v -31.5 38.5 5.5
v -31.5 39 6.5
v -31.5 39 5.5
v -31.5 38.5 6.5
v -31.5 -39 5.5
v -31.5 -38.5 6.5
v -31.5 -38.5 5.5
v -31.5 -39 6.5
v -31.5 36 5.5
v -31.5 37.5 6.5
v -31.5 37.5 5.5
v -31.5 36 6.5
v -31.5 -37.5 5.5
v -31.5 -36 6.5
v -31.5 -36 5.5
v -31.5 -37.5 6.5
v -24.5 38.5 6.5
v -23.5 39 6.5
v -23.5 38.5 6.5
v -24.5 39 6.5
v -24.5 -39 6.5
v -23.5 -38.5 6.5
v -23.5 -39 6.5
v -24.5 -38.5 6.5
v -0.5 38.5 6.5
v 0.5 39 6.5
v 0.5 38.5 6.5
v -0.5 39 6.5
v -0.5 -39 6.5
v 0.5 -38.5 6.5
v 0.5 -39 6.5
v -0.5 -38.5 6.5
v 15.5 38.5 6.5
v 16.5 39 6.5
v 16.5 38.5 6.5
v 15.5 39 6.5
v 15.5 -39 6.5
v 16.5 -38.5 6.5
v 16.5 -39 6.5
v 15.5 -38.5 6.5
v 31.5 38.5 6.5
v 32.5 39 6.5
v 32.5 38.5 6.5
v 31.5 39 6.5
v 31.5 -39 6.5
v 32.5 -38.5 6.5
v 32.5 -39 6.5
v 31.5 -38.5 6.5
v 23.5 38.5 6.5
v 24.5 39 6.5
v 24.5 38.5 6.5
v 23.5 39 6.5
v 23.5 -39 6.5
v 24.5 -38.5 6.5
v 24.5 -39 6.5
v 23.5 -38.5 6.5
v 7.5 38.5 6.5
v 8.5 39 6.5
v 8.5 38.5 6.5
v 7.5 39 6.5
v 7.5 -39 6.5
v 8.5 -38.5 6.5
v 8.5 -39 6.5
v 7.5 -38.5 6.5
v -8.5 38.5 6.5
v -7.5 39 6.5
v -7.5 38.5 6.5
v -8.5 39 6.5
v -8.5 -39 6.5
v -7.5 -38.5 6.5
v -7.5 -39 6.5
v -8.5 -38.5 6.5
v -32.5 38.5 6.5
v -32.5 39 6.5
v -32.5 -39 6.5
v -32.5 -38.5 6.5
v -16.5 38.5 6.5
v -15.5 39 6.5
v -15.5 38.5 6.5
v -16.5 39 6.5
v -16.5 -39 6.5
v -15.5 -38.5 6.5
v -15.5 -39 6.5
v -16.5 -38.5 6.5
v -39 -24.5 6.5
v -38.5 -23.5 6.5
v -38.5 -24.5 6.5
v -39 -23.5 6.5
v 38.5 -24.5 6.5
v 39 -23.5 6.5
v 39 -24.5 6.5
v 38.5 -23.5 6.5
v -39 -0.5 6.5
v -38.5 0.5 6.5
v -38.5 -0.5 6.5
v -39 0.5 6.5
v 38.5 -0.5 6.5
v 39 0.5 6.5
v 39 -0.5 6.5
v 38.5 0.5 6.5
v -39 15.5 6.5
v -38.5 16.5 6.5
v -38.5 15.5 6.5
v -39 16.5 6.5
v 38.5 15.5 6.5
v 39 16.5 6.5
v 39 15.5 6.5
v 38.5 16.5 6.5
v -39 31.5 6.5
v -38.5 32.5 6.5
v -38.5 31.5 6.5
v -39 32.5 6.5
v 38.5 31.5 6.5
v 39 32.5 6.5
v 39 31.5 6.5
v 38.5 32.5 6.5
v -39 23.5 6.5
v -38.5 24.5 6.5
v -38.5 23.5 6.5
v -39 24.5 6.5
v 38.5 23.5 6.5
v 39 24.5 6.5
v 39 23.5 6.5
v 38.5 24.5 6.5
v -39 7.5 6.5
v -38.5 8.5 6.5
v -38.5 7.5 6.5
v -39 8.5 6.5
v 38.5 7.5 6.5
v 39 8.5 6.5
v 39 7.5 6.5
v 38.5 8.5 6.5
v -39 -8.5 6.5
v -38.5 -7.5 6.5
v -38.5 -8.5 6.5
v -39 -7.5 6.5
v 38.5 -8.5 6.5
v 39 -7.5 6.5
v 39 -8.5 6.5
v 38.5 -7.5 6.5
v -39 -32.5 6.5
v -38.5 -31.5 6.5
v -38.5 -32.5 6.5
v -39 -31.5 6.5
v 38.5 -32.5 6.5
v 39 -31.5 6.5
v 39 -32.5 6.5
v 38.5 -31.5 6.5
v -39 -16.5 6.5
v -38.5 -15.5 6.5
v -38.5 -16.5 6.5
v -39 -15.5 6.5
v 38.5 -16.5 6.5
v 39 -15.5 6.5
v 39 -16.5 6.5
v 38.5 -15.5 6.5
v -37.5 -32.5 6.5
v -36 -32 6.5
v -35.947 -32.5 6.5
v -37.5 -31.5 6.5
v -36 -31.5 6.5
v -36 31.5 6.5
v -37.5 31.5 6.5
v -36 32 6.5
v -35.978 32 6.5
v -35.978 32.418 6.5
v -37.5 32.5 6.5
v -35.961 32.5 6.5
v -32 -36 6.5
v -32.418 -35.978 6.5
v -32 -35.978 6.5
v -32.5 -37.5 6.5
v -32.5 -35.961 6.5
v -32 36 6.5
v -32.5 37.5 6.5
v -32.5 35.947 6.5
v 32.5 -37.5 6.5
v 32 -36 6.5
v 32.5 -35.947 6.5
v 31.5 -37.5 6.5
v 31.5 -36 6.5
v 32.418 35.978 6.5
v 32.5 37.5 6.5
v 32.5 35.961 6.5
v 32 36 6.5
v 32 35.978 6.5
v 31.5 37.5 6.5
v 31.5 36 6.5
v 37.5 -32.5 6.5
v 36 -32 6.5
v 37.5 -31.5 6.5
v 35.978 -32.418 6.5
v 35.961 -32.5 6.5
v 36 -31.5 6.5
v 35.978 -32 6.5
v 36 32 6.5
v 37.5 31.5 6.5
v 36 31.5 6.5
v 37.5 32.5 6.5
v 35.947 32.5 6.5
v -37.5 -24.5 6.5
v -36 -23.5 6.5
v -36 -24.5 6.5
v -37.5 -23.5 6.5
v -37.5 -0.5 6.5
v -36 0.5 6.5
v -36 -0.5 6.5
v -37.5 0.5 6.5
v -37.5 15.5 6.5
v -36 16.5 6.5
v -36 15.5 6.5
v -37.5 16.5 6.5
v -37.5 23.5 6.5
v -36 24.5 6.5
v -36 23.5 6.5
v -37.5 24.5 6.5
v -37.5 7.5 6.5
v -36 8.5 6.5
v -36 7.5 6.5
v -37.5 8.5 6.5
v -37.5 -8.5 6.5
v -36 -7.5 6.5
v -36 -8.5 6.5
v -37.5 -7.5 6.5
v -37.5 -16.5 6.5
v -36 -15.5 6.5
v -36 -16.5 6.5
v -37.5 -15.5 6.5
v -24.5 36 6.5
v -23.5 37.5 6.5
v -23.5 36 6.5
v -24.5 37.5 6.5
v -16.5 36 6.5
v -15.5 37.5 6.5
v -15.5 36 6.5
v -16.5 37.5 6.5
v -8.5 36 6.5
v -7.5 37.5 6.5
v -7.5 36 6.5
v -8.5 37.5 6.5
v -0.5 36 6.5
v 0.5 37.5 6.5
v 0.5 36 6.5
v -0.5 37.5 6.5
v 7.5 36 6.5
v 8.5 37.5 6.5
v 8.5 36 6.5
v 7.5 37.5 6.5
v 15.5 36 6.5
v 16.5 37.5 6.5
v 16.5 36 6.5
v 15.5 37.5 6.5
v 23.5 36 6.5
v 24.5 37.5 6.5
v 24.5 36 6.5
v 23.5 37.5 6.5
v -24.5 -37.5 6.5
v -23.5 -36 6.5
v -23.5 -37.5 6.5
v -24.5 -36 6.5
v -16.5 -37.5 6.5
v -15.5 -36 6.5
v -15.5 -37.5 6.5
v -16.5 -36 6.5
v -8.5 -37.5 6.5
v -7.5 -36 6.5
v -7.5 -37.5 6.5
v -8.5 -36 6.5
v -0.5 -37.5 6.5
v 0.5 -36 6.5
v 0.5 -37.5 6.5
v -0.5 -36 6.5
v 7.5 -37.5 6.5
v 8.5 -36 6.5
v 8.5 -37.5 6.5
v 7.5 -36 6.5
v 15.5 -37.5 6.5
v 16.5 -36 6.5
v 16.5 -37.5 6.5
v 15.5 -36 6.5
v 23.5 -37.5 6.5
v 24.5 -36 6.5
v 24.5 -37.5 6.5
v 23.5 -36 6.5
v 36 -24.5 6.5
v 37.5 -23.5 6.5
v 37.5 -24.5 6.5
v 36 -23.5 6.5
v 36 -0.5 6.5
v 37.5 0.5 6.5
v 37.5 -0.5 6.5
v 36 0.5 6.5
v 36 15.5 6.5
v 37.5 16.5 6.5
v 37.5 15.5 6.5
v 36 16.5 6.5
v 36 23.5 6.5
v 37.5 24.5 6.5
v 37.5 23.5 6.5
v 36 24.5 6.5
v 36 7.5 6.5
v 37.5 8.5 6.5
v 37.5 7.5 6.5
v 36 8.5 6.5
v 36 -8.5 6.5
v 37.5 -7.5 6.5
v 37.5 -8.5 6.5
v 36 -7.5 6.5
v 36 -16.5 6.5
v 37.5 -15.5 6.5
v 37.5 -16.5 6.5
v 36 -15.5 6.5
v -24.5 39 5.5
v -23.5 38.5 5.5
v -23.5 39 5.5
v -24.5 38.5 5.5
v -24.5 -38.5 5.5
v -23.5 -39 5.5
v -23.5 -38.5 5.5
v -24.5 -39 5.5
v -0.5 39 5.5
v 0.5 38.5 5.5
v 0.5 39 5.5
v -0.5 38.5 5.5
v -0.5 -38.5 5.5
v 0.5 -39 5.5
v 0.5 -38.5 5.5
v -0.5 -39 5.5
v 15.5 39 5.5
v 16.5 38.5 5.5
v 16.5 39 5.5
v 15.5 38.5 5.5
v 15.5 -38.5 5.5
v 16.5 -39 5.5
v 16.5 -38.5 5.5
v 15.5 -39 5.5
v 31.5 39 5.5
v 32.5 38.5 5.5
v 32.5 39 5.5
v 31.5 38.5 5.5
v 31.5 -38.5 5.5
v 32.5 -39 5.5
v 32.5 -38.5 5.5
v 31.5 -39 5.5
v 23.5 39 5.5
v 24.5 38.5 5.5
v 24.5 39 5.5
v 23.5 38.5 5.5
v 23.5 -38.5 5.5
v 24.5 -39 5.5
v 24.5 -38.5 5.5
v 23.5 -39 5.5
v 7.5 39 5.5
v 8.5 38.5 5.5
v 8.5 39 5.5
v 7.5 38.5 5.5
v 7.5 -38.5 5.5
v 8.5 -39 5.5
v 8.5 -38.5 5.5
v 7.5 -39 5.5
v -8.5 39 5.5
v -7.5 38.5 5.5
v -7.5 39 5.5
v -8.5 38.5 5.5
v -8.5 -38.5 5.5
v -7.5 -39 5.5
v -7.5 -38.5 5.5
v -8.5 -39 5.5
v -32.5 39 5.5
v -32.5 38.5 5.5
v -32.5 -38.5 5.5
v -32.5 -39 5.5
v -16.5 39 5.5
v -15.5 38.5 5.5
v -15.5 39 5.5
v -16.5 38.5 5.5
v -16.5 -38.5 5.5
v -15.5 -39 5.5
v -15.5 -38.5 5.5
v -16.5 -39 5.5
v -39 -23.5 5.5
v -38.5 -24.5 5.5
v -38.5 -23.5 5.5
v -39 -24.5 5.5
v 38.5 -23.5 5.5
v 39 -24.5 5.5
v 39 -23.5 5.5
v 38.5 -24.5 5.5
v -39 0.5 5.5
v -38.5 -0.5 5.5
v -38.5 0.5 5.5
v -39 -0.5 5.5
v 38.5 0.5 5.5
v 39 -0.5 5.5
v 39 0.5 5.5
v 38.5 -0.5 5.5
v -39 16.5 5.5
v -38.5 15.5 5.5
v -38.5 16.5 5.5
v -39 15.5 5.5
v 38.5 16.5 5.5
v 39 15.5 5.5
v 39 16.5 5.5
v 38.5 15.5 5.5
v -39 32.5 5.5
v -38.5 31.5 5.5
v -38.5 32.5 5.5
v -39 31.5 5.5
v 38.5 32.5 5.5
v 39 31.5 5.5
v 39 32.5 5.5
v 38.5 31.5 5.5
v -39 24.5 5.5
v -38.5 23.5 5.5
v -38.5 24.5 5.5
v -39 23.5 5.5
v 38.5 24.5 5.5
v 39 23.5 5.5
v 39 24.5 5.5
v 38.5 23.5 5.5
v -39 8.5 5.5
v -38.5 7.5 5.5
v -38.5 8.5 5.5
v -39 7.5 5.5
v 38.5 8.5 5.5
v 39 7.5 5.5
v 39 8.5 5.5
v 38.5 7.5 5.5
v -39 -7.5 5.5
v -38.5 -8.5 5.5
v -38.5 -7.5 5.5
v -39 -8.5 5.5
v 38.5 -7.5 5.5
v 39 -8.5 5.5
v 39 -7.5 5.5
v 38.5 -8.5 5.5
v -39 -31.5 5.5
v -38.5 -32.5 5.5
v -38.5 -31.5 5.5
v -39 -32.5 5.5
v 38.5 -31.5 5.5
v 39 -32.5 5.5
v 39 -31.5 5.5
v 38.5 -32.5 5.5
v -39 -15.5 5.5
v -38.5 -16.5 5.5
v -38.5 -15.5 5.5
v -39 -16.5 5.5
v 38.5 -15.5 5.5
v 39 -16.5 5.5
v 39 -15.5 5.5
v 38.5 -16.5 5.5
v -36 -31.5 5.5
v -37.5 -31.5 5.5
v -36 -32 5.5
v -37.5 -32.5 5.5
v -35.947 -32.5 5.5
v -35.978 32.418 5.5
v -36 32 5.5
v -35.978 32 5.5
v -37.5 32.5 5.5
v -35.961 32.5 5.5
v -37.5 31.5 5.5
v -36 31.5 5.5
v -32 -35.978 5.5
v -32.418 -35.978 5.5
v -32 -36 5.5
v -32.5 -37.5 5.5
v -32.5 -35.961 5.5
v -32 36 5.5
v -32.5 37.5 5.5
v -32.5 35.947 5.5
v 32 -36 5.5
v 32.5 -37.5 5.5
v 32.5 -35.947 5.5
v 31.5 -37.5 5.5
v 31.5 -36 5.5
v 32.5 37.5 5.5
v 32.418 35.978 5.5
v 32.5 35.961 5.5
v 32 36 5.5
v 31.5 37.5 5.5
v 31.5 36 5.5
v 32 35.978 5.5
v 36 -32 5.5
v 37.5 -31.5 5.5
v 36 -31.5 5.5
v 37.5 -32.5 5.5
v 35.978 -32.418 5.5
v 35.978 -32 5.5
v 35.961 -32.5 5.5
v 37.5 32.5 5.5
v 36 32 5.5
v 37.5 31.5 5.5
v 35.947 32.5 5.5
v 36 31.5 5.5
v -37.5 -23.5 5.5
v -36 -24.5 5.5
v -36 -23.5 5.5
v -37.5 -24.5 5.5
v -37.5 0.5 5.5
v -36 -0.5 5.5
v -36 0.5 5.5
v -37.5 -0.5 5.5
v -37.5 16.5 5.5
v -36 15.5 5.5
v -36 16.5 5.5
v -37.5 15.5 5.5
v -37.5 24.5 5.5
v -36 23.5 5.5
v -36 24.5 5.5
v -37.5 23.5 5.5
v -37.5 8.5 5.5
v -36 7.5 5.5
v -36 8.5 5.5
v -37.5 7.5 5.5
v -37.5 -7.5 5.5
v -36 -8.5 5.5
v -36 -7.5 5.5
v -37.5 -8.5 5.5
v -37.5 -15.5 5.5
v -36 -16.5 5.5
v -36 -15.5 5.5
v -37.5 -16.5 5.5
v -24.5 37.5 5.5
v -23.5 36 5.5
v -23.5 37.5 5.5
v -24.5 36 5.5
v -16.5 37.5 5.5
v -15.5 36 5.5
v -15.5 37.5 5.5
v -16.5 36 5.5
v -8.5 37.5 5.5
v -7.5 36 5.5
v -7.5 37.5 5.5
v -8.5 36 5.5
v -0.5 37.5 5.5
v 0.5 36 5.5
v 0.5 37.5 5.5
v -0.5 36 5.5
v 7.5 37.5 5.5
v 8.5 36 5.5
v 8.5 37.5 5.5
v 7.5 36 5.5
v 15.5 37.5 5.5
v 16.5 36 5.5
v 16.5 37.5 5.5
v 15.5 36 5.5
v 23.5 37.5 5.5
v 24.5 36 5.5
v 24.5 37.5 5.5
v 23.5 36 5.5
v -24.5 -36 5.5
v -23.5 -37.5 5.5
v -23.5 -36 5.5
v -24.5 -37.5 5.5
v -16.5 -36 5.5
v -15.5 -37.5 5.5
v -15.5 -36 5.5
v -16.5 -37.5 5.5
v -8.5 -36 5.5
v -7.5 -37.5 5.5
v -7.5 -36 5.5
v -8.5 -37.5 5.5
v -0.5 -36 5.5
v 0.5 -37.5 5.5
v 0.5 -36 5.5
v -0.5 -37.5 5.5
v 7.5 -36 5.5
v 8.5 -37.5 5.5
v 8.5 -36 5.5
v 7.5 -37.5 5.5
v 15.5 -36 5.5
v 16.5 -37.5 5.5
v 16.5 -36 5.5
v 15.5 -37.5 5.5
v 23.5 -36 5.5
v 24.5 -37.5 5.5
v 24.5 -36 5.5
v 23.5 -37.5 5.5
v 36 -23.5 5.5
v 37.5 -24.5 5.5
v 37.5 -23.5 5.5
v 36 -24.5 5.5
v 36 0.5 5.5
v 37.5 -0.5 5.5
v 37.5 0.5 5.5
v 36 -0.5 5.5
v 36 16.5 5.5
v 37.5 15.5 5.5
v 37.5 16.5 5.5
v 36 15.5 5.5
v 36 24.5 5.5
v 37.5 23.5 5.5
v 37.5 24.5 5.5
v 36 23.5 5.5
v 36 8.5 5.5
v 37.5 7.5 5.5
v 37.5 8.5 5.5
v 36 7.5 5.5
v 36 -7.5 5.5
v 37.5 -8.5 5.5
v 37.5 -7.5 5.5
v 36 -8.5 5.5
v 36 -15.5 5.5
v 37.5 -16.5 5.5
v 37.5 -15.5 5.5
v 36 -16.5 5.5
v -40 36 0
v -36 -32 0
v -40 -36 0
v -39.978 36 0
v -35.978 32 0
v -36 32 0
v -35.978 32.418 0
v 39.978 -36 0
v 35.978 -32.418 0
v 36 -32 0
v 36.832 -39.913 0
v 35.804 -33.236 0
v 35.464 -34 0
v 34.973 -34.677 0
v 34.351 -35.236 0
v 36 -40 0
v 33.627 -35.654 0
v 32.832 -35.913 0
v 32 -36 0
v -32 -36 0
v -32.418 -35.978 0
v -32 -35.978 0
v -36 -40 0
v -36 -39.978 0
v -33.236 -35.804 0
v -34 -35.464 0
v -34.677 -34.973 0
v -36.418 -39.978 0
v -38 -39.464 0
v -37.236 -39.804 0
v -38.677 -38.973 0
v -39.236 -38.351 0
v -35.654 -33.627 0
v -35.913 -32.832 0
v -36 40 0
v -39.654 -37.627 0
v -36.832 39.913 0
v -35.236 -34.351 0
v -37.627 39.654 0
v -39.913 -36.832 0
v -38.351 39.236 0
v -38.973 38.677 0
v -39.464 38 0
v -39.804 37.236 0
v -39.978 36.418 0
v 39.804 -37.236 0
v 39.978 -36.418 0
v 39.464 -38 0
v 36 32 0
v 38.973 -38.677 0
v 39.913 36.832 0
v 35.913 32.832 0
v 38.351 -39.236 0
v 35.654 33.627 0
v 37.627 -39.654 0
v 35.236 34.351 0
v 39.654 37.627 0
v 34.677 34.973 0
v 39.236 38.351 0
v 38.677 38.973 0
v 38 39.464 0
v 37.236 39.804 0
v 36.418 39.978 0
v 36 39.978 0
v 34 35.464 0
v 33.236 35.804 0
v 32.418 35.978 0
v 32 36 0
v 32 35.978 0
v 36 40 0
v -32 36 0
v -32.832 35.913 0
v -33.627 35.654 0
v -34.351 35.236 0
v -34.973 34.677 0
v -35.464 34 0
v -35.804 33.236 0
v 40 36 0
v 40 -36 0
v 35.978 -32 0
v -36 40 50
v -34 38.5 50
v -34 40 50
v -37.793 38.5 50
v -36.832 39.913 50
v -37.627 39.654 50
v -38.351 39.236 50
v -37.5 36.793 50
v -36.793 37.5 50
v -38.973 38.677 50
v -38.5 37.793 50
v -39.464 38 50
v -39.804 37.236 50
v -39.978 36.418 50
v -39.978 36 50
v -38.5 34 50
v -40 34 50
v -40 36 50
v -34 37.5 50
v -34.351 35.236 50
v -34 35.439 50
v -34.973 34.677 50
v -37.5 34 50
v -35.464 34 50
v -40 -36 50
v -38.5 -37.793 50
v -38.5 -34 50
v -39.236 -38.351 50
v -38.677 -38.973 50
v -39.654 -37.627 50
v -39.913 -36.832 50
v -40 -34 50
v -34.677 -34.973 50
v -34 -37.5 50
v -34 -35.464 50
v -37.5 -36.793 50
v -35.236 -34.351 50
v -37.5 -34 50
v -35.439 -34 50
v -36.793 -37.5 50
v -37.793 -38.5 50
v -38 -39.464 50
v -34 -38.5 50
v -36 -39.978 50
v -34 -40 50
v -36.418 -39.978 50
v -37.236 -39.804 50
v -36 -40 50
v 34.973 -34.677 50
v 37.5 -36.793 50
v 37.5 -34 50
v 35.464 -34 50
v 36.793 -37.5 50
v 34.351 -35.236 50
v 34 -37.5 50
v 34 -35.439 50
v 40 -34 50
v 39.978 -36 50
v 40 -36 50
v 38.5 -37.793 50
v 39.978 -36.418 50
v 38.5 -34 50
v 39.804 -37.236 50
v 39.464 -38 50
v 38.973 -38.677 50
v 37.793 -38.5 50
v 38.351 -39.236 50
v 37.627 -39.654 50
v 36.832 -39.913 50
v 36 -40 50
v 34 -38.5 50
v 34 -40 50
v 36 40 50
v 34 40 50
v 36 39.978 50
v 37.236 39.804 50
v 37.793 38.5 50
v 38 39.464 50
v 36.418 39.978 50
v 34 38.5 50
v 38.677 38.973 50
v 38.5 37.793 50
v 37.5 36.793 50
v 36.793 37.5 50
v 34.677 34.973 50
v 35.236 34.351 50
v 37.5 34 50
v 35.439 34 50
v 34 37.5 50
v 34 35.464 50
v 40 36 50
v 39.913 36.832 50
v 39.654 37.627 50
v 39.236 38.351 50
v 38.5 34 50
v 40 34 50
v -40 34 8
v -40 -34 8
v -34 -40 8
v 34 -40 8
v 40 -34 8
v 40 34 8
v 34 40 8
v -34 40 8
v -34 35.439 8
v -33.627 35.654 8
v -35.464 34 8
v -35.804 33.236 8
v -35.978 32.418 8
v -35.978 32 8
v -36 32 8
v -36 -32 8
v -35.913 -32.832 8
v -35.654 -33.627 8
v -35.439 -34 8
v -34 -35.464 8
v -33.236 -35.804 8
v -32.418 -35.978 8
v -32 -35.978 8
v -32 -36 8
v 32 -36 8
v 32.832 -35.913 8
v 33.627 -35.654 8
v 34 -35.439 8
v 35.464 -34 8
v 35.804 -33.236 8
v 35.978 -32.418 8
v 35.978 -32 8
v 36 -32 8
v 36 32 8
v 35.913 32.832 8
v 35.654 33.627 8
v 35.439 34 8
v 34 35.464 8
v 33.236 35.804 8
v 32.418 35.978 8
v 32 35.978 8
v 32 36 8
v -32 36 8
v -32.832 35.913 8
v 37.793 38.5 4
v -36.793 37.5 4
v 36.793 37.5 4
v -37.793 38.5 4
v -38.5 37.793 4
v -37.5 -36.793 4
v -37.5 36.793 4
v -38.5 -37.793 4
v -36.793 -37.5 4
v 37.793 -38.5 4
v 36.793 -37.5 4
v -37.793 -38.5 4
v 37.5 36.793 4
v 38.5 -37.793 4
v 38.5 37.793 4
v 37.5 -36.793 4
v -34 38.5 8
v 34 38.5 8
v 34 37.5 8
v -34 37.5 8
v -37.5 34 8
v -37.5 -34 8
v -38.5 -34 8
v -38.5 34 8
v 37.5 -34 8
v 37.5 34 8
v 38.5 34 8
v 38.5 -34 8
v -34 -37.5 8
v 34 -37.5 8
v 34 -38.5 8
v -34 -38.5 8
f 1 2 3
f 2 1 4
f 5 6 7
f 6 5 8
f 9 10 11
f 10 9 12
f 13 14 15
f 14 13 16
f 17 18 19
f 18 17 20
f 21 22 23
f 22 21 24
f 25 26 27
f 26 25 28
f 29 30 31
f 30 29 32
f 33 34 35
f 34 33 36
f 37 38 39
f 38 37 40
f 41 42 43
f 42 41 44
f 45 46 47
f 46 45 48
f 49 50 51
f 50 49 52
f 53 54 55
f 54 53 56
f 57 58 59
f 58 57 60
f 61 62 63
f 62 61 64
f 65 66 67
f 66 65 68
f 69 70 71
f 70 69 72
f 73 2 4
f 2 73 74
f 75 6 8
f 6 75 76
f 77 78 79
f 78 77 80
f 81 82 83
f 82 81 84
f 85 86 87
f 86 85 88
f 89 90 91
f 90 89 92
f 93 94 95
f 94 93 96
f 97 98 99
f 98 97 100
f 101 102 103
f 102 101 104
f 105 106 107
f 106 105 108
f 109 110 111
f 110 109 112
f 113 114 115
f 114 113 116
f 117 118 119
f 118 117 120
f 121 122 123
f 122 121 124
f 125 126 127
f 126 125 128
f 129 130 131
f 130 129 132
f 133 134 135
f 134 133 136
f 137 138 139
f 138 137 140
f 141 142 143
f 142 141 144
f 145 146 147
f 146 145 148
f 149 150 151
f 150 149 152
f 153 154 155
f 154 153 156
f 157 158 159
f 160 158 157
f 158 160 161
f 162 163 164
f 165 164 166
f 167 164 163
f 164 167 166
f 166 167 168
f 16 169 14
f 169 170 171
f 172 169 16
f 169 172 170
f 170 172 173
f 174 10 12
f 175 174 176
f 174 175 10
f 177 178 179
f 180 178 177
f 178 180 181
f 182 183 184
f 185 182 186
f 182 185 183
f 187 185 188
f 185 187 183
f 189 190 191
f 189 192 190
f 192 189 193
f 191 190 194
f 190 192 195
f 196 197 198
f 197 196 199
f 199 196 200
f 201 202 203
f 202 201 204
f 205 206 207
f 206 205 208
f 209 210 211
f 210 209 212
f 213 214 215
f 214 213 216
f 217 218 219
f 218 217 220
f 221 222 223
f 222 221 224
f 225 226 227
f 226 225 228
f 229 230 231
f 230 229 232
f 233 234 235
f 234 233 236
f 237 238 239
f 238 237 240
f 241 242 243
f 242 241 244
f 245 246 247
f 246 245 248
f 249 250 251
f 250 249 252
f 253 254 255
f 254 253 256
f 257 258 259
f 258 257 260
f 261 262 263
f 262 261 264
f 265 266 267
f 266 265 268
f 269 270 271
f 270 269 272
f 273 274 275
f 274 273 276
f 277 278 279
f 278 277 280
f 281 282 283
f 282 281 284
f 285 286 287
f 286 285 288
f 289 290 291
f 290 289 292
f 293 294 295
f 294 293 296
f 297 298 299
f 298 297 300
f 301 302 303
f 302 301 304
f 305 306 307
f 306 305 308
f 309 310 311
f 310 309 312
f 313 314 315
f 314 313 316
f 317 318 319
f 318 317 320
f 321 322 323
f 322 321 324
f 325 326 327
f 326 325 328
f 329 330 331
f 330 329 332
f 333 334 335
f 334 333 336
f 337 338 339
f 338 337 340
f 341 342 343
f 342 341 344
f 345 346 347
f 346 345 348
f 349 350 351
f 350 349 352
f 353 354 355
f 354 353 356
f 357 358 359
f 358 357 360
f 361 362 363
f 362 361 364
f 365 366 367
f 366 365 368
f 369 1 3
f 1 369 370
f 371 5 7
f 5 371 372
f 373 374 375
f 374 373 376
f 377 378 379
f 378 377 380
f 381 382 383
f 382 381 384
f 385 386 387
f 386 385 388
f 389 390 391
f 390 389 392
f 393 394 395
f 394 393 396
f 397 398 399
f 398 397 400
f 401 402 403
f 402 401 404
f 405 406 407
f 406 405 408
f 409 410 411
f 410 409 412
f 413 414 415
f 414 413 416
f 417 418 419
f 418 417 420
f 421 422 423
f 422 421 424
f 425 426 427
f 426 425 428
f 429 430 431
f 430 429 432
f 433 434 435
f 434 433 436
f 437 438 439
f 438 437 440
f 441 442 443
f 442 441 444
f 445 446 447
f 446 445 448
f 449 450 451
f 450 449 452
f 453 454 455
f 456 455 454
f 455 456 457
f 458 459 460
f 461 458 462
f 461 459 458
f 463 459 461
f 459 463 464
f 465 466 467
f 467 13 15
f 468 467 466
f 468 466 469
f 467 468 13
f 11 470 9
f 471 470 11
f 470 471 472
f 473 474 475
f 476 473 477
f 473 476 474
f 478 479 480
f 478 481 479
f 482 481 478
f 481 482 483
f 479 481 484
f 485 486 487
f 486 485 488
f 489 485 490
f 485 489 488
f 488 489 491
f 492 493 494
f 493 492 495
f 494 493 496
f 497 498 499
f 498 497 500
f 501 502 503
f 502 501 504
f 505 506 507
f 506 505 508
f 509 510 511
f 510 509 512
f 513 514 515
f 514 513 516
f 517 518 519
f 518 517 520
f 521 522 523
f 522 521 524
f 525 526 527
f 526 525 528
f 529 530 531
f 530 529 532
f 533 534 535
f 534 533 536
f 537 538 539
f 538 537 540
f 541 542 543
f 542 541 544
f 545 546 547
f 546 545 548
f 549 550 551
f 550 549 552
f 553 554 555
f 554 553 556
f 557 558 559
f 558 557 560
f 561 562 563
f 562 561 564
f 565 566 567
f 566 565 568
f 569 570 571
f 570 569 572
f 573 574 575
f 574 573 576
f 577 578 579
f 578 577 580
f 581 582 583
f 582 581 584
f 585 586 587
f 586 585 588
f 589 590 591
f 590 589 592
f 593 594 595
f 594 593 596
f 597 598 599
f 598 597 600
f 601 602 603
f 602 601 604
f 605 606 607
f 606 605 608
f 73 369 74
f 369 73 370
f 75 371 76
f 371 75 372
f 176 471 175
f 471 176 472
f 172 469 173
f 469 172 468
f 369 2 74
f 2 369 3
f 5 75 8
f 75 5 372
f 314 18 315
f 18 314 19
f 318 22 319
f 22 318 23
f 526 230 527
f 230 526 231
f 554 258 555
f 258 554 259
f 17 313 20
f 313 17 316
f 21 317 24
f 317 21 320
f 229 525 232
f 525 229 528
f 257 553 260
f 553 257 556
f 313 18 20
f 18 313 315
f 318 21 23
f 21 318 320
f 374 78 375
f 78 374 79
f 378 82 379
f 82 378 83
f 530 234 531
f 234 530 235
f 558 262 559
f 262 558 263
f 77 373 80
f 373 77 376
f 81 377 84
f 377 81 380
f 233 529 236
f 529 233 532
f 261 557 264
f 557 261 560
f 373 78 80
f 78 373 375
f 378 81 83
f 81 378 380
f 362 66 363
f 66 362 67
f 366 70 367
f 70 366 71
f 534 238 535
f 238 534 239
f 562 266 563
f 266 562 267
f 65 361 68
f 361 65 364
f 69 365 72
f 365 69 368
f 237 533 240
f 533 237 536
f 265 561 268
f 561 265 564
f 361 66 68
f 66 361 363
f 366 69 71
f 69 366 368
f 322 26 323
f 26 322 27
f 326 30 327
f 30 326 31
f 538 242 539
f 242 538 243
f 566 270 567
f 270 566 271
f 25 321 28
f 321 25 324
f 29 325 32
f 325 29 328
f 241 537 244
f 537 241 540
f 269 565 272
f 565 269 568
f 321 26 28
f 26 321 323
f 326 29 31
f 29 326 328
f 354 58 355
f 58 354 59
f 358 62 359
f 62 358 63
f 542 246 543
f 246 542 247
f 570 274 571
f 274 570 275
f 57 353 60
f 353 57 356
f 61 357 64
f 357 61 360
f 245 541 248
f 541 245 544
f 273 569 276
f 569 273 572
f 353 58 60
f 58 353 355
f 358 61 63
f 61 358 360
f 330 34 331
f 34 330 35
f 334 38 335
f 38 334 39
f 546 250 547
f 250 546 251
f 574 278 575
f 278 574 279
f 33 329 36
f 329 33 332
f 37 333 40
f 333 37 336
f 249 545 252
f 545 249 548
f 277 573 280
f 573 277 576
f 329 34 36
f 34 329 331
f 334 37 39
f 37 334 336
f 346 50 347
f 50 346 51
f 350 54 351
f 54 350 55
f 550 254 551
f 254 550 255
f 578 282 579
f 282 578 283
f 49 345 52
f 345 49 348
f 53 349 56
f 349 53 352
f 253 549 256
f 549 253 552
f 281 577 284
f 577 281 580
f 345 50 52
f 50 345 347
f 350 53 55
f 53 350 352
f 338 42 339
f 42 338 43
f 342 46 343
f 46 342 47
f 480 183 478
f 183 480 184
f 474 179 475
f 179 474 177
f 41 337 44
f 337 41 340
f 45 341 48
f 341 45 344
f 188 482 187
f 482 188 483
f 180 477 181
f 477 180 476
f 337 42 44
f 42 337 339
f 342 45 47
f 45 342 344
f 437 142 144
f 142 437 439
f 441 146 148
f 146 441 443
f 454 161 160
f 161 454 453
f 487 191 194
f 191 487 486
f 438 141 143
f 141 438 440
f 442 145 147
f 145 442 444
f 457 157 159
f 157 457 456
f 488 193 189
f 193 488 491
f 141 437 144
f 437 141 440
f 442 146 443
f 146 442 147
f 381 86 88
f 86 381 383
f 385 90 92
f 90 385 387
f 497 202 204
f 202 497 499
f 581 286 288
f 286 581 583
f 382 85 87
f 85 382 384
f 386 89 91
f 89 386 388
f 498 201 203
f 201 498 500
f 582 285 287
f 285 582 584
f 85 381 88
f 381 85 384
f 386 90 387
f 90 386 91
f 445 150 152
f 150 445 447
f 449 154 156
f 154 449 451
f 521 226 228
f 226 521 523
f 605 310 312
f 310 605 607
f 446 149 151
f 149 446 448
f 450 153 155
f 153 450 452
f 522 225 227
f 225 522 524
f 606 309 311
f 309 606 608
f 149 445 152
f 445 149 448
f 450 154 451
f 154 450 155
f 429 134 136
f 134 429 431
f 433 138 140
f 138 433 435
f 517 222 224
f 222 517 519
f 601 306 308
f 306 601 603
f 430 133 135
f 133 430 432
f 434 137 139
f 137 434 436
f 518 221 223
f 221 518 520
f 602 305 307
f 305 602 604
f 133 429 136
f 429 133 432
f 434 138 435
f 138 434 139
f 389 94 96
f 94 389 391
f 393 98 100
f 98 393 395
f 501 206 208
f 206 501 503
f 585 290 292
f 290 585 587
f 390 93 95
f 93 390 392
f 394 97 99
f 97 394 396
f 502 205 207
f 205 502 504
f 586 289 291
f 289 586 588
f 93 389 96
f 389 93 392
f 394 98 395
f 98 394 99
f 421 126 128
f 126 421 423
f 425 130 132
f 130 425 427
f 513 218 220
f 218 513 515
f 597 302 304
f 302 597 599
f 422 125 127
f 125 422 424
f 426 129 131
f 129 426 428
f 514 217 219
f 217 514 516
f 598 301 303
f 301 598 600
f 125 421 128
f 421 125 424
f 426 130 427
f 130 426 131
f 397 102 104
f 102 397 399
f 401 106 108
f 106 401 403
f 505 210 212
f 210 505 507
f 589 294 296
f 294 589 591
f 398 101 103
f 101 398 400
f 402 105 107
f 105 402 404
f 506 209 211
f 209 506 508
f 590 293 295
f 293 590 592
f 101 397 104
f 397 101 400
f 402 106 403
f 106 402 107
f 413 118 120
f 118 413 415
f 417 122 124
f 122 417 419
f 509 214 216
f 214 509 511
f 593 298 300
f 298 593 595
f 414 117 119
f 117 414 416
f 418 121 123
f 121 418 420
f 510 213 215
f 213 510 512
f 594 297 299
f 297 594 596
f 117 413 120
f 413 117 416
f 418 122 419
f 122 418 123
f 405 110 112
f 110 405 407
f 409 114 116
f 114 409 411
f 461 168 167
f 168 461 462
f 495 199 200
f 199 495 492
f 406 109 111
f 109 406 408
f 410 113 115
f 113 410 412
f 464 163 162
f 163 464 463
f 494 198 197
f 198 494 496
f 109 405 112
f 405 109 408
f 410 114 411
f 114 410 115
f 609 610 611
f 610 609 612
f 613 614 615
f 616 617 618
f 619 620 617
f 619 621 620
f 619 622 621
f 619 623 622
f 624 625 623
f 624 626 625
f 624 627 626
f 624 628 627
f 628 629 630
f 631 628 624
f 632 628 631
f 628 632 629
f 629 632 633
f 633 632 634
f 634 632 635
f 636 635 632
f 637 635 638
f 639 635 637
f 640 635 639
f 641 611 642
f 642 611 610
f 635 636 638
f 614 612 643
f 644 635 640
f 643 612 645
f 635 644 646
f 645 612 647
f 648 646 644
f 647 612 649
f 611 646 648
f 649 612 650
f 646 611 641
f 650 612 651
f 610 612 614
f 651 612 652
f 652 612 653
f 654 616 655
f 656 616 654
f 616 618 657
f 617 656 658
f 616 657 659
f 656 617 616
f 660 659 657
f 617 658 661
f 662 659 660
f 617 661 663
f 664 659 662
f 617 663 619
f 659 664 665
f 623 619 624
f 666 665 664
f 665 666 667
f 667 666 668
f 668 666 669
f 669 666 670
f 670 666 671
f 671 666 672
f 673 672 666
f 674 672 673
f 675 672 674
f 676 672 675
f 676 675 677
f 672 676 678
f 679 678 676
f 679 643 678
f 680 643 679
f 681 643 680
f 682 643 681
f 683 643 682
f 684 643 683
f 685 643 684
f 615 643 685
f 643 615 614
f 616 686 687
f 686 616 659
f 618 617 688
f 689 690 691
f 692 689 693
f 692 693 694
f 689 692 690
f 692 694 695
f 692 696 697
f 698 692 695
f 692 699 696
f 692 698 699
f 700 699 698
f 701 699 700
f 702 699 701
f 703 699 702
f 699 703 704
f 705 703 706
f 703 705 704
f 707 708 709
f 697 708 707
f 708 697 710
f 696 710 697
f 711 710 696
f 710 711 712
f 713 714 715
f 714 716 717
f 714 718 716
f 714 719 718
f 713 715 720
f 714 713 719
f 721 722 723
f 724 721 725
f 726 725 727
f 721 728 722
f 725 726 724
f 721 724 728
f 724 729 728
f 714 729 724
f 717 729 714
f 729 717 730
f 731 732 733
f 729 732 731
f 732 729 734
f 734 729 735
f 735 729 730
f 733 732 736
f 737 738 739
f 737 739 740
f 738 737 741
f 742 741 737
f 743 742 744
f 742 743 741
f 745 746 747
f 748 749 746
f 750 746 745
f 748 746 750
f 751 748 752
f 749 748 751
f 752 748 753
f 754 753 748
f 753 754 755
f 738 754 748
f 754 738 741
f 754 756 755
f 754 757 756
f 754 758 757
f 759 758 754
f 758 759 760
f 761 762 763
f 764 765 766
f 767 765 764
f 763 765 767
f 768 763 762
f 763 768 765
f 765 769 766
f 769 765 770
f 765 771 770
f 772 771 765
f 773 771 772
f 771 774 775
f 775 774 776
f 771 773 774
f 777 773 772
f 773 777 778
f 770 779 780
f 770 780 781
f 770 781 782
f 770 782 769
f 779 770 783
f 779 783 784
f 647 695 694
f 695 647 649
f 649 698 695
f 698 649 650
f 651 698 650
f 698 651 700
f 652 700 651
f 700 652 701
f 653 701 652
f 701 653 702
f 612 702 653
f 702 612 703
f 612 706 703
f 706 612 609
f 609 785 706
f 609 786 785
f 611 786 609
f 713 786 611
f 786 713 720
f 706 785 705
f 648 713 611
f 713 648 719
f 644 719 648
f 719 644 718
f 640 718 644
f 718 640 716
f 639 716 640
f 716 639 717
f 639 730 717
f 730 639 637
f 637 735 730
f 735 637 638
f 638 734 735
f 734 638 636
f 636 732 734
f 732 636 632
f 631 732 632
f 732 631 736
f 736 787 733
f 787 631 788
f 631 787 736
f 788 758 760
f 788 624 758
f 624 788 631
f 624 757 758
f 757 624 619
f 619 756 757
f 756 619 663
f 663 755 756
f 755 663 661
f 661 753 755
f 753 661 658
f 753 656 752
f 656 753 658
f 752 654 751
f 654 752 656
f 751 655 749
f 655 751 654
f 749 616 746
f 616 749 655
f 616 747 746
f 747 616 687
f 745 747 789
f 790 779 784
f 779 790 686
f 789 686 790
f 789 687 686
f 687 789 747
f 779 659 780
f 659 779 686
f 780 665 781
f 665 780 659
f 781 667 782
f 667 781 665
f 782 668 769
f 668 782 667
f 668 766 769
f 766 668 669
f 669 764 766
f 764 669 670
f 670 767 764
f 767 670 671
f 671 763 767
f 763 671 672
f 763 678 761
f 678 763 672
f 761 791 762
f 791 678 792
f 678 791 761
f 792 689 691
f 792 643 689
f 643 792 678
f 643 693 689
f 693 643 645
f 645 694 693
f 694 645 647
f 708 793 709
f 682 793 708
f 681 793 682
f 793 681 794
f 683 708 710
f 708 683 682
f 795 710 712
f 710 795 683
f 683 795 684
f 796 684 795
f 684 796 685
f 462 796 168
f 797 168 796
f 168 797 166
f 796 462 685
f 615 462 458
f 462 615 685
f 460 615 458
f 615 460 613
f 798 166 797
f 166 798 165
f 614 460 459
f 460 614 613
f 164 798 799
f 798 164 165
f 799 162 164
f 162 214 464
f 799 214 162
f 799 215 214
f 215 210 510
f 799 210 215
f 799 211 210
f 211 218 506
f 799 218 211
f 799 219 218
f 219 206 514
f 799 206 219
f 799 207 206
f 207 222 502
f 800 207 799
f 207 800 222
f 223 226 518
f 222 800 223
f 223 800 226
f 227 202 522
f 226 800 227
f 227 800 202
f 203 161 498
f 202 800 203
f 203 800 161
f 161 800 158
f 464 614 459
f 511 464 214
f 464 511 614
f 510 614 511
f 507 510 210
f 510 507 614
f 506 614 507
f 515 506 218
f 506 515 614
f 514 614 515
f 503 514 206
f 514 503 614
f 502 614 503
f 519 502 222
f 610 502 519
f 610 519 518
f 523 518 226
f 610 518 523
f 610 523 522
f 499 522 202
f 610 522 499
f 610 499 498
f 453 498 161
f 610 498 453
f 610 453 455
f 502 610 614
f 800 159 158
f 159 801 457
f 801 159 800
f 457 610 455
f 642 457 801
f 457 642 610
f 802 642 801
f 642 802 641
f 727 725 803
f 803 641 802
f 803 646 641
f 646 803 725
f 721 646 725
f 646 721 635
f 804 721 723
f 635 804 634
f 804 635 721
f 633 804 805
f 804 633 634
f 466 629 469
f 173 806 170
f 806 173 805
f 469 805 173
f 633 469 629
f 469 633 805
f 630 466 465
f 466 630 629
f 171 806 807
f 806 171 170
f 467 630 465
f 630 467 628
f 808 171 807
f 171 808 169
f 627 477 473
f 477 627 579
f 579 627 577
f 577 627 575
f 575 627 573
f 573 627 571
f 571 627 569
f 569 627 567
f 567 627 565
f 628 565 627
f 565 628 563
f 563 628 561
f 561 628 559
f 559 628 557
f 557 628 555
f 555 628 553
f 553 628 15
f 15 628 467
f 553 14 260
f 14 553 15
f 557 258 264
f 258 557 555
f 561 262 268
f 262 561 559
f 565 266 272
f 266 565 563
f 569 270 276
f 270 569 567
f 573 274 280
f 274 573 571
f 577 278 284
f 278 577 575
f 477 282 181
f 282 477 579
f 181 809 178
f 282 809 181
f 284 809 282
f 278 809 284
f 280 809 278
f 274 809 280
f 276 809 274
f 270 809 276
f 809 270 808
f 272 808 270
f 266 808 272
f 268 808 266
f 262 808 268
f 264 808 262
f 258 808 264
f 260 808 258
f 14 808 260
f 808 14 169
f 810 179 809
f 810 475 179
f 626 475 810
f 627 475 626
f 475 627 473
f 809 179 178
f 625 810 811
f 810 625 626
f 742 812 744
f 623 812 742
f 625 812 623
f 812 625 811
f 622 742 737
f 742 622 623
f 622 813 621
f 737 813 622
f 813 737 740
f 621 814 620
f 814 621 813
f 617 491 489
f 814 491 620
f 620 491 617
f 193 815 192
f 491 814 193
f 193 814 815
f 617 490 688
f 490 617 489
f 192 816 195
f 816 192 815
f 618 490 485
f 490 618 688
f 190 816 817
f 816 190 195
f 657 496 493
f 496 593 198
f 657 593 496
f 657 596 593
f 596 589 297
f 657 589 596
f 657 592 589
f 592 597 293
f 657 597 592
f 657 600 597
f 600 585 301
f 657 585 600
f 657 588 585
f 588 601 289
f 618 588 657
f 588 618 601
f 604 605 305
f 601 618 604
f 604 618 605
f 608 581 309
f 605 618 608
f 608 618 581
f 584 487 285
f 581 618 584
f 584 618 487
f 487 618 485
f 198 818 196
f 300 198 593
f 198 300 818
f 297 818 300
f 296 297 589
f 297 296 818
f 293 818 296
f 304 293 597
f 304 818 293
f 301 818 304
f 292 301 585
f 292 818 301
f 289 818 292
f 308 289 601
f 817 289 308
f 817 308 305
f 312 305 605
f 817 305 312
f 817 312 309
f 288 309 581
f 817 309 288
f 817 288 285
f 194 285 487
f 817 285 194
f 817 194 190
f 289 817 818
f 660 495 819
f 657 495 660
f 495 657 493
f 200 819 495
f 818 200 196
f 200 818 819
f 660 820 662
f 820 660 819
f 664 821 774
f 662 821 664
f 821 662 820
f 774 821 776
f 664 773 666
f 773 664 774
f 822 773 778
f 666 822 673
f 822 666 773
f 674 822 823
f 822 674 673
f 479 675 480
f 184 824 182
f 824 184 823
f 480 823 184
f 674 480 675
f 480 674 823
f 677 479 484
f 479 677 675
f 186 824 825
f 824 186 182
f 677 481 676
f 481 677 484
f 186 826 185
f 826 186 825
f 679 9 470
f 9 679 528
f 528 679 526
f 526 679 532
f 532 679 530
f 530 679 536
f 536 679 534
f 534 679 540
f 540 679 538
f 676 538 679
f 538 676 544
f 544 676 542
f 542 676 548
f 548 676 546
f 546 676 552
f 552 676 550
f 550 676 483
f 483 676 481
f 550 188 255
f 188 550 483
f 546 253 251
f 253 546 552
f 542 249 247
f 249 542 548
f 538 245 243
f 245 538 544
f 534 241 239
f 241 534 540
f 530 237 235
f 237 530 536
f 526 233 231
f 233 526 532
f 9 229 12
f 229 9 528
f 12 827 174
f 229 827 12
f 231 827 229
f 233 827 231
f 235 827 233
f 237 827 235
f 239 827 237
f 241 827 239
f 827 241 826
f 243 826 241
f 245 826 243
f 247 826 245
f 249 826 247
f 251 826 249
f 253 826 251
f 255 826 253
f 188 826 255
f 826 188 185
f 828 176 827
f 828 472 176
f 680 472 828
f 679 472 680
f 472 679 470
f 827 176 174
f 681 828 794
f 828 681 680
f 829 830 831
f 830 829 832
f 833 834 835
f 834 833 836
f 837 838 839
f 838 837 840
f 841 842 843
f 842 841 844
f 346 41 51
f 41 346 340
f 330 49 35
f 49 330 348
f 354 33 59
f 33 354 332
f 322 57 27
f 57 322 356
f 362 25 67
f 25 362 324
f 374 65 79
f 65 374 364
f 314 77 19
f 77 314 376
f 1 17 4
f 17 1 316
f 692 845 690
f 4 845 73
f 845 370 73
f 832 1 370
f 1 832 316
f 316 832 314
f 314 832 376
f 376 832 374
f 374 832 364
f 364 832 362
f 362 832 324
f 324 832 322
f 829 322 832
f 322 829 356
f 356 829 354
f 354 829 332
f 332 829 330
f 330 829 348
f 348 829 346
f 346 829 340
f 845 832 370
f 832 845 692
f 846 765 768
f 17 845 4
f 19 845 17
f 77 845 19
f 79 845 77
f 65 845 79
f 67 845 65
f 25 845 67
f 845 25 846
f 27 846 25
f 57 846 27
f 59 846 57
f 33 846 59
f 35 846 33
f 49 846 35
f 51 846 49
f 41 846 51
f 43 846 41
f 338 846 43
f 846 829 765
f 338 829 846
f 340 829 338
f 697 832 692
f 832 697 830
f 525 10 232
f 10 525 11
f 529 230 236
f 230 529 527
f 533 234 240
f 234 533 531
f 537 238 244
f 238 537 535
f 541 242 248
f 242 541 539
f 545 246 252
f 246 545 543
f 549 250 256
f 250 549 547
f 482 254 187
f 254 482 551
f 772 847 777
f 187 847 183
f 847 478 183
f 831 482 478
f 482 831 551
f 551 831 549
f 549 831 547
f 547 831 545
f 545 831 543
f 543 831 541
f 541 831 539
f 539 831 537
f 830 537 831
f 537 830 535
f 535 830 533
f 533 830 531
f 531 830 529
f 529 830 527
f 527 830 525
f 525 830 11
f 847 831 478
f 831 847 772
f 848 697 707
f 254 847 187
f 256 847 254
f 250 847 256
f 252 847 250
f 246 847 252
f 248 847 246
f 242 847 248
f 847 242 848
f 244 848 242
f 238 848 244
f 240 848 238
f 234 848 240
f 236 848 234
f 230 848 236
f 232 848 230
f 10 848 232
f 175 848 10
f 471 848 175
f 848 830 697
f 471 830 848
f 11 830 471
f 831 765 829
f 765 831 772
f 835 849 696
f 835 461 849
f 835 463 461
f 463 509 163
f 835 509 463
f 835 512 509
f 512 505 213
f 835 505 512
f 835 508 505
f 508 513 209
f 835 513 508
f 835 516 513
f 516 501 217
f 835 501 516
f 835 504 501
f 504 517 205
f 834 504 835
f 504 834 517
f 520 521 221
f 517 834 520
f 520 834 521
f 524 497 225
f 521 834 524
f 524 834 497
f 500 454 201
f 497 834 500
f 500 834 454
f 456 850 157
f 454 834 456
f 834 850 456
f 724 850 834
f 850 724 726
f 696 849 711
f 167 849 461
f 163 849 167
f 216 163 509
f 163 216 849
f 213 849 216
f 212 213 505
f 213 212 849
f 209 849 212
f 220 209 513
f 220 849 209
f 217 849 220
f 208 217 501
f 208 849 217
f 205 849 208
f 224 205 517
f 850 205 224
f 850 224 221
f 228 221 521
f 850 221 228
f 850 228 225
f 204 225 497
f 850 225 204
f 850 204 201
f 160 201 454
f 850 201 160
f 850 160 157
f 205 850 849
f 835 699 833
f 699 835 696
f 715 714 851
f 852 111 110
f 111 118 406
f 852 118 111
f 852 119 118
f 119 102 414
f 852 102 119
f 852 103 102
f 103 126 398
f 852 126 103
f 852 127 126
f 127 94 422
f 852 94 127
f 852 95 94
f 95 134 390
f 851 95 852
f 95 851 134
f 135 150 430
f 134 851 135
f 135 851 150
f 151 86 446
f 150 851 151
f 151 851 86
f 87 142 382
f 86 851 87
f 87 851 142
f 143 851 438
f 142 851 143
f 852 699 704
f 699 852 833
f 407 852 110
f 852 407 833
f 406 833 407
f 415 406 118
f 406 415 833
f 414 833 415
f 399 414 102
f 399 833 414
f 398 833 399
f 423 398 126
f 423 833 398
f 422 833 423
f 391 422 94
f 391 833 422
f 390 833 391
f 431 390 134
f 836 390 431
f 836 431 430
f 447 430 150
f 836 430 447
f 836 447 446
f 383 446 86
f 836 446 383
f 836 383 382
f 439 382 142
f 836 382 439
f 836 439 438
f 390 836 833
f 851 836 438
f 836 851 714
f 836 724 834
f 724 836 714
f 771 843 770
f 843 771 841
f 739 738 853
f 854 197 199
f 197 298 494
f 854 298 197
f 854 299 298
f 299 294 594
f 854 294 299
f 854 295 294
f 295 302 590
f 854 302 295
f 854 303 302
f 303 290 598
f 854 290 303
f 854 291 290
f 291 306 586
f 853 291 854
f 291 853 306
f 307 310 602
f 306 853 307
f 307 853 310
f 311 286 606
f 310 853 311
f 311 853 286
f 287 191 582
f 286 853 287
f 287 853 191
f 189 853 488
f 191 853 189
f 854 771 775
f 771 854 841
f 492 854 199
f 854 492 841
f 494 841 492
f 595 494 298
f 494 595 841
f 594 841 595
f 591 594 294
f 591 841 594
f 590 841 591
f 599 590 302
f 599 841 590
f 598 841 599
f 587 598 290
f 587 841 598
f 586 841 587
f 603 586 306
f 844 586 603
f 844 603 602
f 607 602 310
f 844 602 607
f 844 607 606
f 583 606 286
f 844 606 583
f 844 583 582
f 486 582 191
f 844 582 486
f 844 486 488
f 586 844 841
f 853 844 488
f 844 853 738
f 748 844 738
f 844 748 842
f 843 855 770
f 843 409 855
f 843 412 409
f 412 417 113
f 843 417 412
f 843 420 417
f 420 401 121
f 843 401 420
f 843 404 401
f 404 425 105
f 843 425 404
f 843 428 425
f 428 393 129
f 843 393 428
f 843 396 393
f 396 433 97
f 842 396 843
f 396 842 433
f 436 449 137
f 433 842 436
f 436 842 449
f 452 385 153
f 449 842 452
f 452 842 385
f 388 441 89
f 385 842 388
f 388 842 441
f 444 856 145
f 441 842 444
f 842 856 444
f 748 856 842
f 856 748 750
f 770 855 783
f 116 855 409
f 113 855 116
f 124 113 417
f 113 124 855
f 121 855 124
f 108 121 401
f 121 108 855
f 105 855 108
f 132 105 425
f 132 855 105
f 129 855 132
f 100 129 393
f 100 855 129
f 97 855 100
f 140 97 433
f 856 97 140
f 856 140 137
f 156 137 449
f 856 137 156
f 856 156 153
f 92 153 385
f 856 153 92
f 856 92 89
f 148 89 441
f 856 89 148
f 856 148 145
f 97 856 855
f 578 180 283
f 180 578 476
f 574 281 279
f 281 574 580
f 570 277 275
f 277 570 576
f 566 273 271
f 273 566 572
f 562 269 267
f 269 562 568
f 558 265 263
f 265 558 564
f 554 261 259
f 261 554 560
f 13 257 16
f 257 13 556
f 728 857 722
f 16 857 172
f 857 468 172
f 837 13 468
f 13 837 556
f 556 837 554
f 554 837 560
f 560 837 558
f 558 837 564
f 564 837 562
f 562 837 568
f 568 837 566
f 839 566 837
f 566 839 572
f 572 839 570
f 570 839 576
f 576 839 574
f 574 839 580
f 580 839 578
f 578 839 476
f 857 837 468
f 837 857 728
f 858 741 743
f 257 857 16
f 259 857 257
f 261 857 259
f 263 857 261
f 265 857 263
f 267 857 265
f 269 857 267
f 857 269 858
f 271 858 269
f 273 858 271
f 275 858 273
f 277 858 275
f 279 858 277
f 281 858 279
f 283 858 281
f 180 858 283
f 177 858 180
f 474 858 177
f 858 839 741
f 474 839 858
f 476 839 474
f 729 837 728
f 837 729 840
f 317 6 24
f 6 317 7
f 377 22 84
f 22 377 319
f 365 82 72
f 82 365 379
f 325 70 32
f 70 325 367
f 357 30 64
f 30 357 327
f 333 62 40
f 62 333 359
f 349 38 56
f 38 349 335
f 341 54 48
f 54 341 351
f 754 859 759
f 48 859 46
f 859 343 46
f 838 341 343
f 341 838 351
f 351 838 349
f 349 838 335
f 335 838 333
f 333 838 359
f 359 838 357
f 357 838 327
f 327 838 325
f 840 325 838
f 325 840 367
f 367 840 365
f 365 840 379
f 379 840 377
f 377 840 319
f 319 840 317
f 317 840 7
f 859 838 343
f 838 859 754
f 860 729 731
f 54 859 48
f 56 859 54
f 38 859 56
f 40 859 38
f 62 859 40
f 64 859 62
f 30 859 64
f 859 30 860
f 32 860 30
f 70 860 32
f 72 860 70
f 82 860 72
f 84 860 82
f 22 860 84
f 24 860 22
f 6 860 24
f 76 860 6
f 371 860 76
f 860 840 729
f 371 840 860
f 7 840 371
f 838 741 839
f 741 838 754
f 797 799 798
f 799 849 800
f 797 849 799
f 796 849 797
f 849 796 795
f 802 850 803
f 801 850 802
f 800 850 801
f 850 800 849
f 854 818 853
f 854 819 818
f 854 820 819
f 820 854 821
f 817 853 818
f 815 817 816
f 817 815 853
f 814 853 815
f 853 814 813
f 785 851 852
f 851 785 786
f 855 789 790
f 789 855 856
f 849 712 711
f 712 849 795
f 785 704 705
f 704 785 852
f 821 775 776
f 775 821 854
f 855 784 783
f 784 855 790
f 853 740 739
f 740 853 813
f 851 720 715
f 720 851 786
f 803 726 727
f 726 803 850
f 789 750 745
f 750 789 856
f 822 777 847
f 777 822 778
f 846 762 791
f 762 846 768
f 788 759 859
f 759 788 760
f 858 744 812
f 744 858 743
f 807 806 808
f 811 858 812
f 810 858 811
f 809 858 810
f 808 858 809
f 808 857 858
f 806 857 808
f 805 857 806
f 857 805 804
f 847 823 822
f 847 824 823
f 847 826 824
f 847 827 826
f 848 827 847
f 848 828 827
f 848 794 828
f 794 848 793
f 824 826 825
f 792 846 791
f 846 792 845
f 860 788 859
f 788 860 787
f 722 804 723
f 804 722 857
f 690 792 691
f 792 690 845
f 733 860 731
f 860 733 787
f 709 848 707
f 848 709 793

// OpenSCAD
//
//  Copyright (C) 19-06-2013 Jasper den Ouden.(ojasper.nl)
//
//  This is free software: you can redistribute it and/or modify
//  it under the terms of the GNU General Public License as published
//  by the Free Software Foundation, either version 3 of the License, or
//  (at your option) any later version.
//

$fs=0.5;
t = 4;
w = 80;

pt=1;
wr=1;

h=100;

module base_bottom()
{   union()
    {   square([w,w-2*t],center=true);
        square([w-2*t,w],center=true);
        for( a=[0,90,180,270] ) rotate(a) translate([w/2-t,w/2-t]) circle(t);
    }
}

bh=t;
module bottom()
{   difference()
    {   linear_extrude(height=h/2) base_bottom();
        translate([0,0,bh]) linear_extrude(height=h) base_bottom(w=w-2*t);
        translate([0,0,t]) linear_extrude(height=h) difference()
        {   square([w-t+pt,w-t+pt],center=true); 
            square([w-pt-t,w-pt-t],center=true);
            for( a = [45,-45] ) rotate(a) square([pt,4*w], center=true);
        }
        
        for( a=[0,90] ) rotate(a) for( x = [2*t-w/2 : 2*t  : w/2-2*t] )
                            translate([x,0,1.5*t]) cube([pt,w-2*pt,pt],center=true);
        translate([0,0,h/2+2*t]) cube([2*w,w-3*t,h],center=true);
        translate([0,0,h/2+2*t]) cube([w-3*t,2*w,h],center=true);
    }
}
module top(){ bottom(bh=0); }
//bottom();
top();
